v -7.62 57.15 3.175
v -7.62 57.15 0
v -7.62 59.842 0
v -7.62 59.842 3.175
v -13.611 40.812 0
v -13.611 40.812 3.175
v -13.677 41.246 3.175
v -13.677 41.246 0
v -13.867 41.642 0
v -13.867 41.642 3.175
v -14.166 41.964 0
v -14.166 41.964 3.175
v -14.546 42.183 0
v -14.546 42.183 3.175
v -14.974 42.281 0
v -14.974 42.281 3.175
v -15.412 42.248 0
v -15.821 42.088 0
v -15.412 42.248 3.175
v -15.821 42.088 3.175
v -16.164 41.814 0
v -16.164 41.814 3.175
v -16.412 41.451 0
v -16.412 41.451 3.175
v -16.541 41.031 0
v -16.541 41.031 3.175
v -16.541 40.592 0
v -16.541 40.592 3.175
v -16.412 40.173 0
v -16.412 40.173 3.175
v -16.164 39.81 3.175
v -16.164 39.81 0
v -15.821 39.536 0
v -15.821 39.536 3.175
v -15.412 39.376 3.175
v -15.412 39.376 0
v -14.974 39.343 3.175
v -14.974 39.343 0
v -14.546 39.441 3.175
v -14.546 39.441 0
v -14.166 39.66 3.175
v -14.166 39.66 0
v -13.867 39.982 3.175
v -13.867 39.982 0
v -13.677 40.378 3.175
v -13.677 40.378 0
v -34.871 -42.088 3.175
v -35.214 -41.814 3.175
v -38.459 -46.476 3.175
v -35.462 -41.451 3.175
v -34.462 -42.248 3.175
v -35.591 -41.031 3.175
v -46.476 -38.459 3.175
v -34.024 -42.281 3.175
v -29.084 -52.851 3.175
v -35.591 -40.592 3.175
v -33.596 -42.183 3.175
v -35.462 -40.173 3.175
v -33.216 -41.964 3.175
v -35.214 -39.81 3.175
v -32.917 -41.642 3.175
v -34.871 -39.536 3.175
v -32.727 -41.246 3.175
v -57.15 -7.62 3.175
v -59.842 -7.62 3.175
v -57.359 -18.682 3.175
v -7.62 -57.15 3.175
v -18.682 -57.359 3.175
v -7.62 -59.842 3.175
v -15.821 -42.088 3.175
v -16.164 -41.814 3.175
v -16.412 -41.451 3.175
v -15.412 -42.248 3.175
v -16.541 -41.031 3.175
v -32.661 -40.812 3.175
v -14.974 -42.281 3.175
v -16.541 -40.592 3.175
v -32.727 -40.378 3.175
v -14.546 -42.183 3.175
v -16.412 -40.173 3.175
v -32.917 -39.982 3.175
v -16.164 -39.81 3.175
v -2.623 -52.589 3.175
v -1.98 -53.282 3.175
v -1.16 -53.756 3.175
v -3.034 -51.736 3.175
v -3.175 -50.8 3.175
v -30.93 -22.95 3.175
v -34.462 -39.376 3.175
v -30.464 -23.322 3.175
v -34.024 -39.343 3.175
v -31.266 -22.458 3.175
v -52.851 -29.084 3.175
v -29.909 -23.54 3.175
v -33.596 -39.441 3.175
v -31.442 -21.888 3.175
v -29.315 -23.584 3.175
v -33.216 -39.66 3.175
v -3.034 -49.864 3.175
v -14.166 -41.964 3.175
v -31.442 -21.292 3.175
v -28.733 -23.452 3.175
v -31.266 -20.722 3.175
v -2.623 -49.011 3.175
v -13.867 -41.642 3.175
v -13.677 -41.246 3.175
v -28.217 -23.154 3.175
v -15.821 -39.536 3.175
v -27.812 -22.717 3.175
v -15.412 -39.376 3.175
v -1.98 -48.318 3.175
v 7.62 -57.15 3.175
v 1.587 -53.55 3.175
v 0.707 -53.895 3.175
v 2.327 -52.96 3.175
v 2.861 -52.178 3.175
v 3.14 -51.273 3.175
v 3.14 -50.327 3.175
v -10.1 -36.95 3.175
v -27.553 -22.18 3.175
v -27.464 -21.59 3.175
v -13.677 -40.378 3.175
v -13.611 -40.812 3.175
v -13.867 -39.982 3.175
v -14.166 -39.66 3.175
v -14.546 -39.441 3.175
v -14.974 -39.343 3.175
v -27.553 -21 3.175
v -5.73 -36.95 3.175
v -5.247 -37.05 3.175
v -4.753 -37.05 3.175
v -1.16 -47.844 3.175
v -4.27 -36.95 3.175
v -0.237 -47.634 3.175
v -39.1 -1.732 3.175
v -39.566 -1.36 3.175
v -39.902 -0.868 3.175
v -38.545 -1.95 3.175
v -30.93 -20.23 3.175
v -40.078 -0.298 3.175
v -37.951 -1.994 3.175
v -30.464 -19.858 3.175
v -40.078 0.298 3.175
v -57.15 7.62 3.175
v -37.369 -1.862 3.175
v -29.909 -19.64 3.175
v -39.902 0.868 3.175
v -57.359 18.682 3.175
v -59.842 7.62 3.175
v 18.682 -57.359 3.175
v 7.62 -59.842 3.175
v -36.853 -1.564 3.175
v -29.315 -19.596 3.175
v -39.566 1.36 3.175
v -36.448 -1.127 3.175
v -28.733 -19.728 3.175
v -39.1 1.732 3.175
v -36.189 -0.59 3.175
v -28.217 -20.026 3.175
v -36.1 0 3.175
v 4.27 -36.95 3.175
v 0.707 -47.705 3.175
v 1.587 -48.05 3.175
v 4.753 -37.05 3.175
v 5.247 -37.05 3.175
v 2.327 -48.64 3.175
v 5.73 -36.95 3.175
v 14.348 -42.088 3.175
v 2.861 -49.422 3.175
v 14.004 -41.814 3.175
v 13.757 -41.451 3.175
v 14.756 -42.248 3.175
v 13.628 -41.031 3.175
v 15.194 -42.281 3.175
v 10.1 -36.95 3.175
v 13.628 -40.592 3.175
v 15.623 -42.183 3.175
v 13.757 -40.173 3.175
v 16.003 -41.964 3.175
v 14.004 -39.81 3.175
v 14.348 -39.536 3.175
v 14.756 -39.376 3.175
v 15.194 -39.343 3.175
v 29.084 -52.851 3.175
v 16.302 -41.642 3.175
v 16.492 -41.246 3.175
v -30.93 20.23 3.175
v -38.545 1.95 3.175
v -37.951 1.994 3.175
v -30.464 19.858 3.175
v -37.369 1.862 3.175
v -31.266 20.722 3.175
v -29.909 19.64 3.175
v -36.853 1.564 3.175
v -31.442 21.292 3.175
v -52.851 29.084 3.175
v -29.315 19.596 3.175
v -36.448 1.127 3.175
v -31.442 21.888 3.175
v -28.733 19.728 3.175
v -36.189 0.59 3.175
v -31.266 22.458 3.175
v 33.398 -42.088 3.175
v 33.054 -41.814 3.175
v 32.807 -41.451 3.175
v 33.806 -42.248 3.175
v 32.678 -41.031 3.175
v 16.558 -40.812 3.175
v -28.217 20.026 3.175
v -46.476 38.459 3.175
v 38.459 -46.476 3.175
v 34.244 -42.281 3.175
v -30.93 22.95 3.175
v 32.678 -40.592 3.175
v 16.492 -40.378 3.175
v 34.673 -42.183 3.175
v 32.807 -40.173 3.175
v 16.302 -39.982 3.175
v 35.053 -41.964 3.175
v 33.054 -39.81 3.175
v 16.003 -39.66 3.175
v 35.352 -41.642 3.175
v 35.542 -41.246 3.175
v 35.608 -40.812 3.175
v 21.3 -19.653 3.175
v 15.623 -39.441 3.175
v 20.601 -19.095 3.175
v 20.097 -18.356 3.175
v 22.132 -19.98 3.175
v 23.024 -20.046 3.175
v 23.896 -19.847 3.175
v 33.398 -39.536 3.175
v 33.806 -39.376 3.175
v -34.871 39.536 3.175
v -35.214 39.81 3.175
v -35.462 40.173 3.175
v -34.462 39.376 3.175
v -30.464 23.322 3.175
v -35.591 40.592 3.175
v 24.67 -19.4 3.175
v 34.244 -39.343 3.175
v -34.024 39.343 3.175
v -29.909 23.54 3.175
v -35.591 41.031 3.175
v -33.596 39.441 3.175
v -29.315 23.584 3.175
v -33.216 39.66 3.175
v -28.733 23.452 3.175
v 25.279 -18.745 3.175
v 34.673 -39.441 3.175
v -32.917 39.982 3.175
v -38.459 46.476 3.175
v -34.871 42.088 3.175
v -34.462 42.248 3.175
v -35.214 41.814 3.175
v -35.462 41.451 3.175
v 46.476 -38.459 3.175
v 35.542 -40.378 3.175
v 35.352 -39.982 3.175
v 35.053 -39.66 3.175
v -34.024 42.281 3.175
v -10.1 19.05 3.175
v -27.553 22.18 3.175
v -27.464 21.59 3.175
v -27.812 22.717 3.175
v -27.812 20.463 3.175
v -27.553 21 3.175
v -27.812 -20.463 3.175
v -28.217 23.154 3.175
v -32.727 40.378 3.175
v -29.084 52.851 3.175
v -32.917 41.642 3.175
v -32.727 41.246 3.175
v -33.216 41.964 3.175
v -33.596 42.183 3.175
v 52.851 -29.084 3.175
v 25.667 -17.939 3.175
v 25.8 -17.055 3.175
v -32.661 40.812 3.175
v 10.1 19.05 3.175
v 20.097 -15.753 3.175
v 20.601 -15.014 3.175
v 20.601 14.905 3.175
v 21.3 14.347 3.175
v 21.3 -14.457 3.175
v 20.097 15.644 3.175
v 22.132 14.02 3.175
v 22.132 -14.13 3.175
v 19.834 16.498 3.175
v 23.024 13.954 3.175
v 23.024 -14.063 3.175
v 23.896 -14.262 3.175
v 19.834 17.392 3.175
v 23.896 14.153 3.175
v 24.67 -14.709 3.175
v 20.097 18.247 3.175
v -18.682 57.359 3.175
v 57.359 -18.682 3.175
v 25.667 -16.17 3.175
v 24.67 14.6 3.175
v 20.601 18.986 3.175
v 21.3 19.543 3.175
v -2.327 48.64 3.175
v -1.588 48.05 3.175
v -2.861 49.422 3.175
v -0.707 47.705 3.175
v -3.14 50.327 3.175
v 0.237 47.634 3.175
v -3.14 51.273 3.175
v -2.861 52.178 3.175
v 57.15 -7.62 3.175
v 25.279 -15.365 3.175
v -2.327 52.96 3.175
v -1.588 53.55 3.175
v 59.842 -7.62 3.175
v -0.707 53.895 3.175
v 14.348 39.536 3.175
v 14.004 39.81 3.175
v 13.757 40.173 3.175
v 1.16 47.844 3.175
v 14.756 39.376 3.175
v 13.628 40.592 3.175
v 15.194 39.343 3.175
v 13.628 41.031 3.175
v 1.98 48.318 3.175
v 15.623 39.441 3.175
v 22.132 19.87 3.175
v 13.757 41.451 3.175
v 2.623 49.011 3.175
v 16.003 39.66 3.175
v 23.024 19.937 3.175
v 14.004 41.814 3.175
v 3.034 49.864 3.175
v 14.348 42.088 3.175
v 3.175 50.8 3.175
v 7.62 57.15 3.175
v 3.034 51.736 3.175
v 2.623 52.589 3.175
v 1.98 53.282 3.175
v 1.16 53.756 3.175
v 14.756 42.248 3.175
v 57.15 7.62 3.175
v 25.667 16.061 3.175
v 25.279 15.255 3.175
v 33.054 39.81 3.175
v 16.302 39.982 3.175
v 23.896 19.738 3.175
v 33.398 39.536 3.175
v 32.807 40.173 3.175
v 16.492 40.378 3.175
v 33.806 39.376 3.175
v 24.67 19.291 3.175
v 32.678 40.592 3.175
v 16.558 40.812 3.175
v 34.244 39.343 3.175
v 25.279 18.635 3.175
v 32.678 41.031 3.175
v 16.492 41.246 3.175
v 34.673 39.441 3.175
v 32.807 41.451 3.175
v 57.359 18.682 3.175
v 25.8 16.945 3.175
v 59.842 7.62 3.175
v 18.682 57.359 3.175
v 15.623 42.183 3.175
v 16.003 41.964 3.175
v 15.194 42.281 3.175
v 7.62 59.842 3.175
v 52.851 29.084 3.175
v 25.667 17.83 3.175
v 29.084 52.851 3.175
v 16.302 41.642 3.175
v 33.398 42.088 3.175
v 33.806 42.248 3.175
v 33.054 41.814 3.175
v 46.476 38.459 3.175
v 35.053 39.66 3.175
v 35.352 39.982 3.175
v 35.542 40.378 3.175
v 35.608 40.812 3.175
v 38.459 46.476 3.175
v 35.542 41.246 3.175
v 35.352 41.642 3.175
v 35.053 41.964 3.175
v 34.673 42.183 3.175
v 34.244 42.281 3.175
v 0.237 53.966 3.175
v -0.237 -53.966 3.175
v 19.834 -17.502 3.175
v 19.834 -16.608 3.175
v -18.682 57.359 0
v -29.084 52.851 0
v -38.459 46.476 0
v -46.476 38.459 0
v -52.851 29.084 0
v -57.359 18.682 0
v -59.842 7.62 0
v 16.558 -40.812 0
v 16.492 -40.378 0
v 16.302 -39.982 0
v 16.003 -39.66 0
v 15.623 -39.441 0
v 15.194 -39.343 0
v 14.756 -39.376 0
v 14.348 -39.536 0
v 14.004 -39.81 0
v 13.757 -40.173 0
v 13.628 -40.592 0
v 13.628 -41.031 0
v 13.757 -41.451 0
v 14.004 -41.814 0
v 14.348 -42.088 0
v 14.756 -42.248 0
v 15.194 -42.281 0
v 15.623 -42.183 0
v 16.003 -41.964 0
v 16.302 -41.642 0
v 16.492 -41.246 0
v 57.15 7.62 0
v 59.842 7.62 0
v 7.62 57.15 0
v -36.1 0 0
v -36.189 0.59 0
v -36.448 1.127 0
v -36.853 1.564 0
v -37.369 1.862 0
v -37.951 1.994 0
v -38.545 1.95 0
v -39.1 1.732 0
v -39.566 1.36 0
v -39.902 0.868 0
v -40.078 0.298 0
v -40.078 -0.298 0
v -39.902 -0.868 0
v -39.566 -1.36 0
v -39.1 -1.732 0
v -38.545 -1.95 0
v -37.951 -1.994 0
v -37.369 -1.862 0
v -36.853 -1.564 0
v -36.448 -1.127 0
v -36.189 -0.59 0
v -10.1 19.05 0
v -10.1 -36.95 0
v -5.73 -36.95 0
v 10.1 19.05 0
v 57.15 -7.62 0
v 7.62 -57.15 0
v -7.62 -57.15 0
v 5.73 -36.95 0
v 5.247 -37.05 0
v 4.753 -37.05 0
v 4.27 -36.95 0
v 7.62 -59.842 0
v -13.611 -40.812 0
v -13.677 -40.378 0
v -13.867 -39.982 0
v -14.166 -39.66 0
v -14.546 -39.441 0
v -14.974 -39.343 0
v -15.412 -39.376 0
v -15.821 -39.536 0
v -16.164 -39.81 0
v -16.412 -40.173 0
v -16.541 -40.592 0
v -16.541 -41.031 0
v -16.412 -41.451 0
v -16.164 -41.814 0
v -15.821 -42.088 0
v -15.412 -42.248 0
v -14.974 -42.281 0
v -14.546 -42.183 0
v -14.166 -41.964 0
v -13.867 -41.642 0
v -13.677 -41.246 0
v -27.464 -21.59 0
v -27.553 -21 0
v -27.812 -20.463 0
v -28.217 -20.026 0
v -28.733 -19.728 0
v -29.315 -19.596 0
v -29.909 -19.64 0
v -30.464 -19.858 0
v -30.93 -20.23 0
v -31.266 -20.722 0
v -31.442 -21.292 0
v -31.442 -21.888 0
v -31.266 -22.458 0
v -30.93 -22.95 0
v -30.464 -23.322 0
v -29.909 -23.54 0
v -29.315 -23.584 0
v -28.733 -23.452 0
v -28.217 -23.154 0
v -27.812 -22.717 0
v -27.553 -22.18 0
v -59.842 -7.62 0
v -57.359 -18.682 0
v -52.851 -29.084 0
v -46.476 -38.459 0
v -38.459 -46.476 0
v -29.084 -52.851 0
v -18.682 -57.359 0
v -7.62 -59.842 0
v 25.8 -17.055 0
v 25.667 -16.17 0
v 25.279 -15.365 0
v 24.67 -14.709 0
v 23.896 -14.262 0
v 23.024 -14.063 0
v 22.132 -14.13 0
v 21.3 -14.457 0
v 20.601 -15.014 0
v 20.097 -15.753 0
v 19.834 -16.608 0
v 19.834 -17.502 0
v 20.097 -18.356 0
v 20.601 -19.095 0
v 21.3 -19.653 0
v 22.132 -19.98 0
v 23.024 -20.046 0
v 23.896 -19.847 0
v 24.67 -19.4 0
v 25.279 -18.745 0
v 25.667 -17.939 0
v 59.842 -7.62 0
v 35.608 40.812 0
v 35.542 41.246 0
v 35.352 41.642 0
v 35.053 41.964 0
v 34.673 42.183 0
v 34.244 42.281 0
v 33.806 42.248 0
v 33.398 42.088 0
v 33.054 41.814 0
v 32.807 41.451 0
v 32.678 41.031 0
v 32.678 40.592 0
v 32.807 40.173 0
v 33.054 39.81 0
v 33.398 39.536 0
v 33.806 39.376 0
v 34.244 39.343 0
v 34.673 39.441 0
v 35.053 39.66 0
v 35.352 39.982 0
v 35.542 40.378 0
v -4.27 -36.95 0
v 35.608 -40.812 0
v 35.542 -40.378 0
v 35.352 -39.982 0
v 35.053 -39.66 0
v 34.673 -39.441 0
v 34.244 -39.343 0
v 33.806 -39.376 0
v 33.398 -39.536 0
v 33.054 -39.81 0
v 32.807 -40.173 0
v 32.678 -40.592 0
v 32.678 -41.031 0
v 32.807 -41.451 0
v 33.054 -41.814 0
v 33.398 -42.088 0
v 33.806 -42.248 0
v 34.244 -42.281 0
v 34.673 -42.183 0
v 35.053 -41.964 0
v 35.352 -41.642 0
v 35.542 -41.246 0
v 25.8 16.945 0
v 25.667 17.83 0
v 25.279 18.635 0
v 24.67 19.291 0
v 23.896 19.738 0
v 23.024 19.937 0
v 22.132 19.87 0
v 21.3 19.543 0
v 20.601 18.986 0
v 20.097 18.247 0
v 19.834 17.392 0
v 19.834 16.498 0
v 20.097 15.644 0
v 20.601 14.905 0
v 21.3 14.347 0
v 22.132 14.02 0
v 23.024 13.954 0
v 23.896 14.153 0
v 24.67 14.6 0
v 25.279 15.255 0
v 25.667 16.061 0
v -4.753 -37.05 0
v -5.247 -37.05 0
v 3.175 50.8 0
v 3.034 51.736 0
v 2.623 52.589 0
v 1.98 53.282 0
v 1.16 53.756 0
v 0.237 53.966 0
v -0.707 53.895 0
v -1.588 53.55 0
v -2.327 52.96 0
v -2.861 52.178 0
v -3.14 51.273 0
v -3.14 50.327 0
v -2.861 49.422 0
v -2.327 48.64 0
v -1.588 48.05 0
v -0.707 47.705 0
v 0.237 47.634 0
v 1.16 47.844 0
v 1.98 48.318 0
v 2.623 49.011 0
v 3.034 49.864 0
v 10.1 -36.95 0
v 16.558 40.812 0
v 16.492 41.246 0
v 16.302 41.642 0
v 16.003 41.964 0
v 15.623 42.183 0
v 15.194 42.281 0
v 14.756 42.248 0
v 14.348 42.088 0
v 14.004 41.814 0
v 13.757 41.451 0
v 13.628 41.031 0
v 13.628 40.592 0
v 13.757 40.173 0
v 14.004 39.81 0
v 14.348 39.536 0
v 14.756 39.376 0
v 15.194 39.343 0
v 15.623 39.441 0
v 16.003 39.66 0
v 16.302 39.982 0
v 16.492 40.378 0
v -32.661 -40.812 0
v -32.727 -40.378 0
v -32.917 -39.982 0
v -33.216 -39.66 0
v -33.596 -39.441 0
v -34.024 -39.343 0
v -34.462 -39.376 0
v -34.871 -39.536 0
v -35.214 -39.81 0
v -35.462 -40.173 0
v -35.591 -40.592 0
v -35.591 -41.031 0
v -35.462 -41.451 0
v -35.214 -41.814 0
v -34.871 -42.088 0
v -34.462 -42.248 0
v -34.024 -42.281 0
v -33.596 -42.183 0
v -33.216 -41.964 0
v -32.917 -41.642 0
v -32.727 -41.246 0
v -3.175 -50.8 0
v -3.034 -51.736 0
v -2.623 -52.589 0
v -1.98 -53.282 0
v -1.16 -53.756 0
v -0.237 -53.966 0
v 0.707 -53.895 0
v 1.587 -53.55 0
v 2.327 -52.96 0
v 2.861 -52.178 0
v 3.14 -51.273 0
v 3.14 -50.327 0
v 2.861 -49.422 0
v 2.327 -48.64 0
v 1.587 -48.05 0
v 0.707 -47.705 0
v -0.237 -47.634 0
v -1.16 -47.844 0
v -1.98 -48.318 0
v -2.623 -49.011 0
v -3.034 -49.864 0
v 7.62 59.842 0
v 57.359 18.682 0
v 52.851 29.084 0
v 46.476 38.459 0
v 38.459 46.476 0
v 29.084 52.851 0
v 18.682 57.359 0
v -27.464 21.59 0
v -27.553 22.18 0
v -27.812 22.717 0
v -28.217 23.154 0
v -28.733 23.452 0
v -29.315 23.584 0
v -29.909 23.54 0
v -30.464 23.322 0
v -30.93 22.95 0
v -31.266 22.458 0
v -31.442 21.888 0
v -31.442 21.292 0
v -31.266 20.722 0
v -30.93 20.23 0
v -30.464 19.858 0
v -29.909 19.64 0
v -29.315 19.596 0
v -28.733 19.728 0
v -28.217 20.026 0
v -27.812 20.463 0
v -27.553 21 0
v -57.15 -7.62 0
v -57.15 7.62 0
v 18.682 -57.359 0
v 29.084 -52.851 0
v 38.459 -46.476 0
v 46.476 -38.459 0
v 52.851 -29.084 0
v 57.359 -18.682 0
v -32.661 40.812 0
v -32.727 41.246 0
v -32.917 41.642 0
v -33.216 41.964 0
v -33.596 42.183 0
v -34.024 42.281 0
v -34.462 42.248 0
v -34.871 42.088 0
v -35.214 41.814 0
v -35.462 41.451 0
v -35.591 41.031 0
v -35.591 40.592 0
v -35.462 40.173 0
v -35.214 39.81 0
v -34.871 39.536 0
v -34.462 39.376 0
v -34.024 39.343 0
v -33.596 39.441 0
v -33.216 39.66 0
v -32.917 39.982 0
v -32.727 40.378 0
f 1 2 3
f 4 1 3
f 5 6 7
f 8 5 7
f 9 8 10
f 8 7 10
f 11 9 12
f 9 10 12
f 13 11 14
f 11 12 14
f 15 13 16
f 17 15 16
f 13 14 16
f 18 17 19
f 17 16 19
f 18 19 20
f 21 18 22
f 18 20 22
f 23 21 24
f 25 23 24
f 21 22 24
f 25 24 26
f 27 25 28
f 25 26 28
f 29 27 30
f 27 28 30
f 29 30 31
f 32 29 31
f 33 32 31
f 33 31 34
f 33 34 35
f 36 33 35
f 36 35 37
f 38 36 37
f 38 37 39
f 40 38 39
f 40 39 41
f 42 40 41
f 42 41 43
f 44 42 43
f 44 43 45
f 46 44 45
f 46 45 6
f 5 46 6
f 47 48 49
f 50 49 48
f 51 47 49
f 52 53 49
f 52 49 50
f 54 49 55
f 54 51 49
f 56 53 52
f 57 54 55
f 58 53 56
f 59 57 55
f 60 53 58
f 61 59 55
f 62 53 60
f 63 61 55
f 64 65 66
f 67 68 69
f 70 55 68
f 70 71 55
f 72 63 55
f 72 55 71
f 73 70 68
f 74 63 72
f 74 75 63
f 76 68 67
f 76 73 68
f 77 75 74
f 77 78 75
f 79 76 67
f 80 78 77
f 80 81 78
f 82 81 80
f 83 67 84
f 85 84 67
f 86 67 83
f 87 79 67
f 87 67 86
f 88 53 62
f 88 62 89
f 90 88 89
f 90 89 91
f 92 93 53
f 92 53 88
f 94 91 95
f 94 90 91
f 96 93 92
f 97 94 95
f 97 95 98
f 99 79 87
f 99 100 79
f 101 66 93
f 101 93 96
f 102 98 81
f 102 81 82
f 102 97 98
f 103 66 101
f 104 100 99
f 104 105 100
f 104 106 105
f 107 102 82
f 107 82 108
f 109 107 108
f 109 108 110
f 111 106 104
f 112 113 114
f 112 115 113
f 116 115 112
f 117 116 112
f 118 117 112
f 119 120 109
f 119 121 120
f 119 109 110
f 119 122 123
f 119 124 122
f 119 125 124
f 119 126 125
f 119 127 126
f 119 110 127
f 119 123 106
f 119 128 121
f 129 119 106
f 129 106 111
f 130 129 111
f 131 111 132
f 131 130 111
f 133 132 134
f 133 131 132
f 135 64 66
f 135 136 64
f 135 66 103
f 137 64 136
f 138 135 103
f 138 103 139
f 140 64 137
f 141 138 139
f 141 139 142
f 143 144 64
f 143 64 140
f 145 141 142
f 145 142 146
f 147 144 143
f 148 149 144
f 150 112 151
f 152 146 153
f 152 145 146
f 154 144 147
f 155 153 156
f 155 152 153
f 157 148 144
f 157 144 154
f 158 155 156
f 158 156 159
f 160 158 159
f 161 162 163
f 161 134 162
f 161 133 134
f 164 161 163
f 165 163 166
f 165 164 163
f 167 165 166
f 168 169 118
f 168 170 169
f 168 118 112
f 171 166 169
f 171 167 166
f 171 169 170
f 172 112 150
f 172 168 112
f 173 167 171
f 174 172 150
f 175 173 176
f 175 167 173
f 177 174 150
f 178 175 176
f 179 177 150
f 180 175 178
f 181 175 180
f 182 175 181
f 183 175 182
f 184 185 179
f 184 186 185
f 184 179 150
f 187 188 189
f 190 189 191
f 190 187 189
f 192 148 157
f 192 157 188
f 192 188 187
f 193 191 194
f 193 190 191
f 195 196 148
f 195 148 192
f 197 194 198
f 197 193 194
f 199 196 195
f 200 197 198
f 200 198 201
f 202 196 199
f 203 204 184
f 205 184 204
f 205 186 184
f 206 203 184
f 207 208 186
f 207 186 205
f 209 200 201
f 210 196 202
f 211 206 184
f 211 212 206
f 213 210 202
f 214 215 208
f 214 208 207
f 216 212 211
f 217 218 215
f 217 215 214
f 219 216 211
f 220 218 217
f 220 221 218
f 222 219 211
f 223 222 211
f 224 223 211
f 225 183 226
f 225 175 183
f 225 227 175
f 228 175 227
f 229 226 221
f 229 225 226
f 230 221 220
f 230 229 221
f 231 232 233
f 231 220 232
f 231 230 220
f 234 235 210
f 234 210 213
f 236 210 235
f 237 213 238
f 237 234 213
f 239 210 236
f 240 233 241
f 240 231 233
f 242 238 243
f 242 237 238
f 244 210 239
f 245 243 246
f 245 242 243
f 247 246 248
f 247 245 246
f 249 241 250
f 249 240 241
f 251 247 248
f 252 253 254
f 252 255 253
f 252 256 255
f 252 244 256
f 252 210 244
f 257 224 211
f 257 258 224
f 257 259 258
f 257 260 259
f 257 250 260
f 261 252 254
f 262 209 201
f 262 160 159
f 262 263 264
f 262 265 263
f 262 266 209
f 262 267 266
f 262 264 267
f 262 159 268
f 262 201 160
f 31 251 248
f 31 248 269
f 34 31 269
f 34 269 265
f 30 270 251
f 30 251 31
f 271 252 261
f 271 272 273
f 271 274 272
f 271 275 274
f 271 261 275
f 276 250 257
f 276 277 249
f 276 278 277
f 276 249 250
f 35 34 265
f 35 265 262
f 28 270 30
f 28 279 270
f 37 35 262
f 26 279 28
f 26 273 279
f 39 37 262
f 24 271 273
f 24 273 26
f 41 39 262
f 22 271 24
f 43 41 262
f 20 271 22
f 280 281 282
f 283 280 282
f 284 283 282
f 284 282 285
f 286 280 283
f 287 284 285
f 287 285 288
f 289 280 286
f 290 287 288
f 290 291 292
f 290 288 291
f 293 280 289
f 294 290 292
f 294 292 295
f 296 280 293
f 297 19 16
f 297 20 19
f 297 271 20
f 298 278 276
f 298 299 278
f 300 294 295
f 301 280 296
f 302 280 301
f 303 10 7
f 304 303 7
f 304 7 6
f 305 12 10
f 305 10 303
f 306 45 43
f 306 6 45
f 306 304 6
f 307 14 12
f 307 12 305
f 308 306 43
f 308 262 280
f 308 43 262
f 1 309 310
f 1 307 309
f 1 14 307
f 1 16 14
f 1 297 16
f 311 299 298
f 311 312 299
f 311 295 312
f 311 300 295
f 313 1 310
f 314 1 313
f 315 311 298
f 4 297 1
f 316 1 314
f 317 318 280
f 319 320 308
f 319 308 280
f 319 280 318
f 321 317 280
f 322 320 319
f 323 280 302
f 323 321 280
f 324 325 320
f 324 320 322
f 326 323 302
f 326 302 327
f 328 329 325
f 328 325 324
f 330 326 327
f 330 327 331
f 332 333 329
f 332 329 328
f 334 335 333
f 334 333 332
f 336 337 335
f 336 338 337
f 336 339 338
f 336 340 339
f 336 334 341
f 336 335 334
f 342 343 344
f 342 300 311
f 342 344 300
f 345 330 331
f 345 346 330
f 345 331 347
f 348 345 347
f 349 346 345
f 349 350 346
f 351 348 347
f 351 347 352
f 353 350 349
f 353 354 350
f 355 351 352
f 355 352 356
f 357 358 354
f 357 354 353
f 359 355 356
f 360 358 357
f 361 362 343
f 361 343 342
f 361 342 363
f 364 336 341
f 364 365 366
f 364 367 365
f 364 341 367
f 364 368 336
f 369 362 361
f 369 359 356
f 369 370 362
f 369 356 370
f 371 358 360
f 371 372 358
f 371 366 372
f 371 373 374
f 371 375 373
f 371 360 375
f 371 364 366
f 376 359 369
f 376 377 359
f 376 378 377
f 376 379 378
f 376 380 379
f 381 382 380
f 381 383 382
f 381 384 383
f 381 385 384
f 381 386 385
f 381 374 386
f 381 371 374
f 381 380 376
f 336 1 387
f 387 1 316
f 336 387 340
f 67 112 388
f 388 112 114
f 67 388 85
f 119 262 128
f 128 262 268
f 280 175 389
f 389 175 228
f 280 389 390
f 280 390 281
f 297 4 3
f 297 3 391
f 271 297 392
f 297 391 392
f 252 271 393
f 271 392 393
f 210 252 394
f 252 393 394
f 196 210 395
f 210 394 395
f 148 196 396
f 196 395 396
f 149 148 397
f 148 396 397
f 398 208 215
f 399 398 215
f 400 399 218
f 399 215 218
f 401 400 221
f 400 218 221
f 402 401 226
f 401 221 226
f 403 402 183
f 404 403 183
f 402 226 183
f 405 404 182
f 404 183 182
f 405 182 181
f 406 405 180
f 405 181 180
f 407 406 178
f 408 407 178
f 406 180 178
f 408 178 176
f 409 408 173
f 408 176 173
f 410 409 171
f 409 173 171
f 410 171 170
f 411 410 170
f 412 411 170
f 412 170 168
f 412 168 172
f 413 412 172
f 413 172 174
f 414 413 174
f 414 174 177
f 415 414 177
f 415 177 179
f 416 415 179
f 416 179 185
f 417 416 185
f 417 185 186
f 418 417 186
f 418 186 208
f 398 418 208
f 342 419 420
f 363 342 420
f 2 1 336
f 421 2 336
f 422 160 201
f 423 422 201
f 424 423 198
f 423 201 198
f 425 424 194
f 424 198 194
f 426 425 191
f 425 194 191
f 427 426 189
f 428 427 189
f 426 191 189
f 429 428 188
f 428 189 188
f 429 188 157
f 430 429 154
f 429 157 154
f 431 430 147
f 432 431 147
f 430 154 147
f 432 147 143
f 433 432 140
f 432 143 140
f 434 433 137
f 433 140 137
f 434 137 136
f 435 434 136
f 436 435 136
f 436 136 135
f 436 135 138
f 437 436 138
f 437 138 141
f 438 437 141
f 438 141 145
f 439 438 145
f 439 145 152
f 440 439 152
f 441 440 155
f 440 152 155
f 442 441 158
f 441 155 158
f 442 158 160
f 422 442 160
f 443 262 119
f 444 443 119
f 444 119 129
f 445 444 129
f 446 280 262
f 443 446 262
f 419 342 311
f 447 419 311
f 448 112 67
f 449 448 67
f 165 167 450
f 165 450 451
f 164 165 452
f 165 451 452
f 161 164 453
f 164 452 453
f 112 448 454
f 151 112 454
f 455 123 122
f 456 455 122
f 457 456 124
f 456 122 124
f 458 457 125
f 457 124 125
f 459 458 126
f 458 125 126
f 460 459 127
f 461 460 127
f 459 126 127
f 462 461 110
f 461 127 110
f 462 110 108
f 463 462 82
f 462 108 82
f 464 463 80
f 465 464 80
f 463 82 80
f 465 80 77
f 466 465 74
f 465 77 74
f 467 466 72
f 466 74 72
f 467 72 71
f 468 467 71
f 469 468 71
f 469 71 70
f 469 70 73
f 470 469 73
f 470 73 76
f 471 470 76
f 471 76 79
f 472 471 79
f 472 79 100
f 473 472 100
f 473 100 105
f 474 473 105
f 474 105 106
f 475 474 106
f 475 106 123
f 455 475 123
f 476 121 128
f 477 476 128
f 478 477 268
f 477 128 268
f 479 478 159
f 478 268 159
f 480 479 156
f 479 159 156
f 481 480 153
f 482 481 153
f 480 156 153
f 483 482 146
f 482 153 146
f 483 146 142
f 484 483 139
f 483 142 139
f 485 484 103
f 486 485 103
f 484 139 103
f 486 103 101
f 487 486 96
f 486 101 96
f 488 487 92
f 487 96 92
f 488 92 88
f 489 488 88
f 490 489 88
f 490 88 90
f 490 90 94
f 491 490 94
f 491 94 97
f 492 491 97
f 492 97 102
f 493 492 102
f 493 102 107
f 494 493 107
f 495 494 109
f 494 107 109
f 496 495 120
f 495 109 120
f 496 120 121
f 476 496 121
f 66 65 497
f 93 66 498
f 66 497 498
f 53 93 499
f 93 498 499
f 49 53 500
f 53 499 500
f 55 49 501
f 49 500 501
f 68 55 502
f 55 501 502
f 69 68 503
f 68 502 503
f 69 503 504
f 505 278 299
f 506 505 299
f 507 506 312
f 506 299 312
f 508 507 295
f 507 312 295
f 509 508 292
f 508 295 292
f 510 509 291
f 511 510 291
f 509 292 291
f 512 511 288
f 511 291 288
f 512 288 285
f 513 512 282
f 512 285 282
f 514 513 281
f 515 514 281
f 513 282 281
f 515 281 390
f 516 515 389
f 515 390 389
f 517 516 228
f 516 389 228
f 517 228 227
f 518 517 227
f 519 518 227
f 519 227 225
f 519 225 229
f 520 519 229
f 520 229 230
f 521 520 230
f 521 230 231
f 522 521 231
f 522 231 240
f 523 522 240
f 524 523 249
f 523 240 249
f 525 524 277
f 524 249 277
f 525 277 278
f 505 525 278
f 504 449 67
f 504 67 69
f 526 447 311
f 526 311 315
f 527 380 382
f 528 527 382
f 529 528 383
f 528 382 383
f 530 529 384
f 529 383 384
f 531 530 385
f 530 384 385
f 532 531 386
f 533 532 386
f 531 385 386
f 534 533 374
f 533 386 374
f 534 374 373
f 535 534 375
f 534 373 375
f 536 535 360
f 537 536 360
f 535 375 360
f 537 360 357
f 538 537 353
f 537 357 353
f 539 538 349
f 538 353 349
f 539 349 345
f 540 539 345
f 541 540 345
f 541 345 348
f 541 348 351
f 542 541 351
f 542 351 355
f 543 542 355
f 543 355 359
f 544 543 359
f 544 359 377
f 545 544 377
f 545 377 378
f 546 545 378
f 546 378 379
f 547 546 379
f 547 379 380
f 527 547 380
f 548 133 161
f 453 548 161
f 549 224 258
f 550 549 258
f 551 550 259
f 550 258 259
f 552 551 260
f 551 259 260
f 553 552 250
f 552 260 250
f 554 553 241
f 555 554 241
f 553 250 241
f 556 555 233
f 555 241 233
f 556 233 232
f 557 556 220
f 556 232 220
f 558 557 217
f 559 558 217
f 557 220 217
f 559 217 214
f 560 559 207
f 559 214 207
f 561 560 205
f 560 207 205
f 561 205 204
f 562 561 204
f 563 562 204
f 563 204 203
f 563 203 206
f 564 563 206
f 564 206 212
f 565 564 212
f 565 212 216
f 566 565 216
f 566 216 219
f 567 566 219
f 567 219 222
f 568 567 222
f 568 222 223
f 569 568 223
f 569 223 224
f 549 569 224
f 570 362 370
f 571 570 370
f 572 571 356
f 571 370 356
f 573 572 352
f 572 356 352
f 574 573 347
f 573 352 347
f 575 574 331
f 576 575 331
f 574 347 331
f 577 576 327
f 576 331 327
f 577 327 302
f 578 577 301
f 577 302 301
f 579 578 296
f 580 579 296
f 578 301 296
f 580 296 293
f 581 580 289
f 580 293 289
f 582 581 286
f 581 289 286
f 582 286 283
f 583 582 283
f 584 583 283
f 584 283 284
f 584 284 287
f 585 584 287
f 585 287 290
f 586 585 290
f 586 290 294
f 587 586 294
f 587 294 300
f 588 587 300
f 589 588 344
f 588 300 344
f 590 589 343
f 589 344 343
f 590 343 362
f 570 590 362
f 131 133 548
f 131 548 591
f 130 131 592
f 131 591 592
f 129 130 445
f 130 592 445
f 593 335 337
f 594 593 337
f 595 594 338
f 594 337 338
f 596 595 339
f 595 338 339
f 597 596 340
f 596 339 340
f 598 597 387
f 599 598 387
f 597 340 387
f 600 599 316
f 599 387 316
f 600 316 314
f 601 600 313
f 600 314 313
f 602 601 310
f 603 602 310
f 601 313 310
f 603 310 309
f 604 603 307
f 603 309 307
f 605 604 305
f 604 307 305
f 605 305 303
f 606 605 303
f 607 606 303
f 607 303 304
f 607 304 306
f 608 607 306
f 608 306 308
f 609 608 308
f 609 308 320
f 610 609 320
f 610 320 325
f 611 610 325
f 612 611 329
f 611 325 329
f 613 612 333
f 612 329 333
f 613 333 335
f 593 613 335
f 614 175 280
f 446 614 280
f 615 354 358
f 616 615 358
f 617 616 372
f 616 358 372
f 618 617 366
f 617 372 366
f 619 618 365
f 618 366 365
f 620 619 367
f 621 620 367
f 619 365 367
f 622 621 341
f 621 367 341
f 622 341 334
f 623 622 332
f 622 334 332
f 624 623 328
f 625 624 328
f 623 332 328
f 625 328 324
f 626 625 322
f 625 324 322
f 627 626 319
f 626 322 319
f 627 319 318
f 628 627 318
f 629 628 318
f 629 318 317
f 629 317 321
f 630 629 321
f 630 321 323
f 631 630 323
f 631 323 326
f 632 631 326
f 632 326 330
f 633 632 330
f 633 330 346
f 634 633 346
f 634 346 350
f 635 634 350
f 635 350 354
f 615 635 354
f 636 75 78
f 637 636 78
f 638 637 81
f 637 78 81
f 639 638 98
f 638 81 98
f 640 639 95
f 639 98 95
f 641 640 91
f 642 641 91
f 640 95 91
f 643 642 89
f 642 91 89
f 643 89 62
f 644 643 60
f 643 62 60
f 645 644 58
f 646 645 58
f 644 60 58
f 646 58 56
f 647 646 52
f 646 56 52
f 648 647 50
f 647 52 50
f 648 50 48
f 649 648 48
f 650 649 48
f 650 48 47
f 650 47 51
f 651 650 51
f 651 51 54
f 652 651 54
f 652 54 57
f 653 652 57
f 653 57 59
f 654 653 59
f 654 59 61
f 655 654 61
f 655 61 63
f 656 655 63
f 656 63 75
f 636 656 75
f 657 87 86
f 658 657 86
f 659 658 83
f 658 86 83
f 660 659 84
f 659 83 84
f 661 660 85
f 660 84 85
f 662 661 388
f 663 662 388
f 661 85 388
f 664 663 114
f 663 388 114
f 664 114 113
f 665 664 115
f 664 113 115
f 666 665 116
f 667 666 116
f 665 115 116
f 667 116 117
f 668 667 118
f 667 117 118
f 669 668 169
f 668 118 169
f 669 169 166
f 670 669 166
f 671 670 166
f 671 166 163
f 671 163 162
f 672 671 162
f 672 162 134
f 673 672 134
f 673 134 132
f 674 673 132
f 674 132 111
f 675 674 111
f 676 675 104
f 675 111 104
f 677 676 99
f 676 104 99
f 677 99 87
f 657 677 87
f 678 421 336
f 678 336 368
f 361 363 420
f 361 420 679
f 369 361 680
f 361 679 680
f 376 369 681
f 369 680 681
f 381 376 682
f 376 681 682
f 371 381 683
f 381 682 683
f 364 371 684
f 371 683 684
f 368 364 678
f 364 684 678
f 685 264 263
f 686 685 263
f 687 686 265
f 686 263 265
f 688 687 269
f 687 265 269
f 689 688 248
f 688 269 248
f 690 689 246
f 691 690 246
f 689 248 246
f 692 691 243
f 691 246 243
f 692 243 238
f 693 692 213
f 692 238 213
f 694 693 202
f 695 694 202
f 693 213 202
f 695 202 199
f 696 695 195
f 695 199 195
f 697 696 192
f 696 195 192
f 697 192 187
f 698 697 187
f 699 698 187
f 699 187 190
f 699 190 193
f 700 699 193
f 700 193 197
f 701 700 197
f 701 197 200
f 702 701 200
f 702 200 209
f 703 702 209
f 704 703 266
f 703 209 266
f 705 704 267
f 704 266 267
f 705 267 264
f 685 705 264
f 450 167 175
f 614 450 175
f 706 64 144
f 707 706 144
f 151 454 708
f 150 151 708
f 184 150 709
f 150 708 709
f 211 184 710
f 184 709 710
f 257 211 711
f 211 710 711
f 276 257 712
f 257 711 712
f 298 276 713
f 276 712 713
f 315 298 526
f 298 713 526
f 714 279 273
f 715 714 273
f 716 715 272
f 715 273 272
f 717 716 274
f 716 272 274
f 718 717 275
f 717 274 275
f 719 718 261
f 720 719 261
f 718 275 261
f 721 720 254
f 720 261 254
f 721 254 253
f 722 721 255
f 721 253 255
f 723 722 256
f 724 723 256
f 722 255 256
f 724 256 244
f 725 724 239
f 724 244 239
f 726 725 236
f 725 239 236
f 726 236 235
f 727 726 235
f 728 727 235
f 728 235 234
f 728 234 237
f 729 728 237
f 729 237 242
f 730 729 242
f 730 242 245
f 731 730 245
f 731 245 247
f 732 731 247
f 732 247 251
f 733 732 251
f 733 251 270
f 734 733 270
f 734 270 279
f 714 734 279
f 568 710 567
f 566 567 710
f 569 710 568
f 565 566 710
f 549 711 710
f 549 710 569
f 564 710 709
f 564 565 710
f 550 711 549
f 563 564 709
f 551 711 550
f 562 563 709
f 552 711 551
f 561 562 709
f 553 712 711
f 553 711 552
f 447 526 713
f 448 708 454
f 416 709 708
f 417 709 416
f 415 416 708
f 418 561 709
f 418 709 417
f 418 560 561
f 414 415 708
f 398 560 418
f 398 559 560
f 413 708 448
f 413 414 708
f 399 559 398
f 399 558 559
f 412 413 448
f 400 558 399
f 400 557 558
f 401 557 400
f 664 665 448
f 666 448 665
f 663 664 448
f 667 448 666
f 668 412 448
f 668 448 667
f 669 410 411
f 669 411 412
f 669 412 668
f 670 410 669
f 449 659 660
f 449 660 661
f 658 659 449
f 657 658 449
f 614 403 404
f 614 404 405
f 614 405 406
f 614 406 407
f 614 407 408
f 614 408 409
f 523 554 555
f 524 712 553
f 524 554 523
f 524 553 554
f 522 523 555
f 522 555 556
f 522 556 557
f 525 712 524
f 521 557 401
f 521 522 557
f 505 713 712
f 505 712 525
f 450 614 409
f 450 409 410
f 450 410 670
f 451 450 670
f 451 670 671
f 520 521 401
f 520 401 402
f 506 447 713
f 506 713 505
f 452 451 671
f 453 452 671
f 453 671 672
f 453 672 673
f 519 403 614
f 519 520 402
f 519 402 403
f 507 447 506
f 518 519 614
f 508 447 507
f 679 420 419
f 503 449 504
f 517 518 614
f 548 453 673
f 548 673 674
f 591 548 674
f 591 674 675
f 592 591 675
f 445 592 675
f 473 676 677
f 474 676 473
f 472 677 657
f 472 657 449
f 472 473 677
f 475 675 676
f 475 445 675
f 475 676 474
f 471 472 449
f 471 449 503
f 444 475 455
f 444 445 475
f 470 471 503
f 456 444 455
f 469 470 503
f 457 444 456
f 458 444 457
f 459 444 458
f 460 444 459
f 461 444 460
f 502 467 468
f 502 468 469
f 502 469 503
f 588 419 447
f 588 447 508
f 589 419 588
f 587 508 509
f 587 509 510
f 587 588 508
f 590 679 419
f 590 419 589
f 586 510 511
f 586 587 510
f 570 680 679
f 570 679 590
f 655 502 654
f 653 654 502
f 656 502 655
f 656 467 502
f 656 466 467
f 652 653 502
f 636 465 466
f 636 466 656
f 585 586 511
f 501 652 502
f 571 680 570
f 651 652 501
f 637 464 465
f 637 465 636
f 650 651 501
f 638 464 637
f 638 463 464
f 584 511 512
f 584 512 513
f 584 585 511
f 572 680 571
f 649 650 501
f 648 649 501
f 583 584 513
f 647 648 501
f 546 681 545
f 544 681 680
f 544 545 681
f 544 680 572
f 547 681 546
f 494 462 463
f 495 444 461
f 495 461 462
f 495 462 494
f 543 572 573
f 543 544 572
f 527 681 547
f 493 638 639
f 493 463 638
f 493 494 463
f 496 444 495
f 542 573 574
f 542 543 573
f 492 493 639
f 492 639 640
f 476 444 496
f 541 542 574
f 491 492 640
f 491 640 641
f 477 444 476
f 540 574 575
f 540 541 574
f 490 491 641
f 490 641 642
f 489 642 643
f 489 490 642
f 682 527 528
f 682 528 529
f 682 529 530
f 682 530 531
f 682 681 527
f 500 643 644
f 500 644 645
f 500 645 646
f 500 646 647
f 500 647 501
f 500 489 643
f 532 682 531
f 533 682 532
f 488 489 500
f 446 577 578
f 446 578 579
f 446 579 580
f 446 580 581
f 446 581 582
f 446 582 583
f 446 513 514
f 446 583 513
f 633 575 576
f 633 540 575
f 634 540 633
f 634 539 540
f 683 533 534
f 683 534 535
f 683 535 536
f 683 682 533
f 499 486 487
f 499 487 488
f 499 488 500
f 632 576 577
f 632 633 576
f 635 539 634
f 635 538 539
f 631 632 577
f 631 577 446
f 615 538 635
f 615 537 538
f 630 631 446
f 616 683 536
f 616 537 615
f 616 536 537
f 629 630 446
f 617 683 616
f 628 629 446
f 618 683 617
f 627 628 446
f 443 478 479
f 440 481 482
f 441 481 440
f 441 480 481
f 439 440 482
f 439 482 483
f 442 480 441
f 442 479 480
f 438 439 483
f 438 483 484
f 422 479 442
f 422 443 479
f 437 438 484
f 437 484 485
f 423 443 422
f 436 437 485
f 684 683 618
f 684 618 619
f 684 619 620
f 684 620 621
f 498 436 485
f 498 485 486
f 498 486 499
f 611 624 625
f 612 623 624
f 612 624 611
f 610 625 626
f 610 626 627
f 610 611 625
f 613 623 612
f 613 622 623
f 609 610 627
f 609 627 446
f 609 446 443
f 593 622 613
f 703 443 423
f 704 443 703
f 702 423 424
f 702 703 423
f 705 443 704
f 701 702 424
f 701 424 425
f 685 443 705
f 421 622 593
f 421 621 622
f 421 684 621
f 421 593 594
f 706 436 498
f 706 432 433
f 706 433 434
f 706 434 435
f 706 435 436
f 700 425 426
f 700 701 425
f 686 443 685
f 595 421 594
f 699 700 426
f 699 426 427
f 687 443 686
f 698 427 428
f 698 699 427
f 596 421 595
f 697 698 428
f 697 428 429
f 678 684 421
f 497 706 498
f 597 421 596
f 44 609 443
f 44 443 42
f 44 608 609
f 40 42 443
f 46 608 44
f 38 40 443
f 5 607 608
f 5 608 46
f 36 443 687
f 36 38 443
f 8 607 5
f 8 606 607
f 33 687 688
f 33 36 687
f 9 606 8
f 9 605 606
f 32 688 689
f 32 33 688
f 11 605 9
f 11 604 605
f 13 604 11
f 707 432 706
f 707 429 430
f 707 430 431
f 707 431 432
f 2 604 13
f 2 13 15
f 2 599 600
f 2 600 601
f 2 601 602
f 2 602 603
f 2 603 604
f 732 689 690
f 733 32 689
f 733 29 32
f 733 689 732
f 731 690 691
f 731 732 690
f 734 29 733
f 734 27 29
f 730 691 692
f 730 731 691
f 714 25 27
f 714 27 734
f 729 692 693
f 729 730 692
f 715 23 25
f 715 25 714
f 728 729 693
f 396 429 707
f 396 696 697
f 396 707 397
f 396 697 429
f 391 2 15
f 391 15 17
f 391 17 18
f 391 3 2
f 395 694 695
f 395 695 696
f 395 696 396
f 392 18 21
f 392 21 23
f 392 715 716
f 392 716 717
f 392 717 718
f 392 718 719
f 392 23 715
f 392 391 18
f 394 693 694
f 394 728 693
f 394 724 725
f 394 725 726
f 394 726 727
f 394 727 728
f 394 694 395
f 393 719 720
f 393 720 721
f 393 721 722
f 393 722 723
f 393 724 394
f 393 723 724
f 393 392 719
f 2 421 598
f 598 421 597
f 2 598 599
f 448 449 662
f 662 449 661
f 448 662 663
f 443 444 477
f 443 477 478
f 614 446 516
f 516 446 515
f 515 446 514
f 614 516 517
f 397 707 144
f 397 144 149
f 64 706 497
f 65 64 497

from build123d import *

# Parameters (mm, degrees)
SKETCH1_R           = 60.325
BOSS_EXTRUDE1_DEPTH = 3.175
SKETCH2_R           = 3.175
SKETCH2_W           = 15.24
SKETCH2_H           = 6.35
CUT_EXTRUDE1_DEPTH  = 3.175
CIRPATTERN1_COUNT   = 4
SKETCH3_R           = 2
SKETCH3_R_2         = 3
CUT_EXTRUDE2_DEPTH  = 3.175
SKETCH4_R           = 2.413
CUT_EXTRUDE3_DEPTH  = 3.175
SKETCH5_R           = 3.175
BOSS_EXTRUDE2_DEPTH = 3.175
SKETCH6_R           = 1.4732
CUT_EXTRUDE4_DEPTH  = 4.175


with BuildPart() as part:
    # Sketch1 → Boss-Extrude1 (new body)
    with BuildSketch(Plane.XY):
        Circle(SKETCH1_R)
    extrude(amount=BOSS_EXTRUDE1_DEPTH)

    # Sketch2 → Cut-Extrude1 (cut)
    with BuildSketch(Plane.XY.offset(3.175)):
        with Locations((0, 50.8)):
            Circle(SKETCH2_R)
        with Locations((0, 60.325)):
            Rectangle(SKETCH2_W, SKETCH2_H)
    cut_extrude1 = extrude(amount=-CUT_EXTRUDE1_DEPTH, mode=Mode.SUBTRACT)

    # CirPattern1: Cut-Extrude1 ×4 about axis
    cirpattern1_axis = Axis((0, 0, 0), (0, 0, 1))
    for i in range(1, CIRPATTERN1_COUNT):
        add(cut_extrude1.rotate(cirpattern1_axis, i * 360 / CIRPATTERN1_COUNT), mode=Mode.SUBTRACT)

    # Sketch3 → Cut-Extrude2 (cut)
    with BuildSketch(Plane.XY.offset(3.175)):
        with Locations((-38.1, 0)):
            Circle(SKETCH3_R)
        with Locations((-29.464, 21.59)):
            Circle(SKETCH3_R)
        with Locations((-29.464, -21.59)):
            Circle(SKETCH3_R)
        with Locations((22.8, 16.945239473)):
            Circle(SKETCH3_R_2)
        with Locations((22.8, -17.054760527)):
            Circle(SKETCH3_R_2)
        Polygon((-10.1, 19.05), (-10.1, -35.95), (-10.1, -36.95), (-9.1, -36.95), (9.1, -36.95), (10.1, -36.95), (10.1, -35.95), (10.1, 2.35), (10.1, 19.05), align=None)
    extrude(amount=-CUT_EXTRUDE2_DEPTH, mode=Mode.SUBTRACT)

    # Sketch4 → Cut-Extrude3 (cut)
    with BuildSketch(Plane(origin=(0, 0, 0), x_dir=(-1, 0, 0), z_dir=(0, 0, -1))):
        with Locations((5, -34.65)):
            Circle(SKETCH4_R)
        with Locations((-5, -34.65)):
            Circle(SKETCH4_R)
        with Locations((-5, 13.35)):
            Circle(SKETCH4_R)
        with Locations((5, 13.35)):
            Circle(SKETCH4_R)
    extrude(amount=-CUT_EXTRUDE3_DEPTH, mode=Mode.SUBTRACT)

    # Sketch5 → Boss-Extrude2 (add)
    with BuildSketch(Plane(origin=(0, 0, 0), x_dir=(-1, 0, 0), z_dir=(0, 0, -1))):
        with Locations((-50.8, 0)):
            Circle(SKETCH5_R)
        with Locations((50.8, 0)):
            Circle(SKETCH5_R)
    extrude(amount=-BOSS_EXTRUDE2_DEPTH)

    # Sketch6 → Cut-Extrude4 (cut, through all)
    with BuildSketch(Plane.XY.offset(3.175)):
        with Locations((15.084311186, 40.81189221)):
            Circle(SKETCH6_R)
        with Locations((34.134311186, 40.81189221)):
            Circle(SKETCH6_R)
        with Locations((34.134311186, -40.81189221)):
            Circle(SKETCH6_R)
        with Locations((15.084311186, -40.81189221)):
            Circle(SKETCH6_R)
        with Locations((-15.084311186, -40.81189221)):
            Circle(SKETCH6_R)
        with Locations((-34.134311186, -40.81189221)):
            Circle(SKETCH6_R)
        with Locations((-34.134311186, 40.81189221)):
            Circle(SKETCH6_R)
        with Locations((-15.084311186, 40.81189221)):
            Circle(SKETCH6_R)
    extrude(amount=-CUT_EXTRUDE4_DEPTH, mode=Mode.SUBTRACT)


solid = part.part
